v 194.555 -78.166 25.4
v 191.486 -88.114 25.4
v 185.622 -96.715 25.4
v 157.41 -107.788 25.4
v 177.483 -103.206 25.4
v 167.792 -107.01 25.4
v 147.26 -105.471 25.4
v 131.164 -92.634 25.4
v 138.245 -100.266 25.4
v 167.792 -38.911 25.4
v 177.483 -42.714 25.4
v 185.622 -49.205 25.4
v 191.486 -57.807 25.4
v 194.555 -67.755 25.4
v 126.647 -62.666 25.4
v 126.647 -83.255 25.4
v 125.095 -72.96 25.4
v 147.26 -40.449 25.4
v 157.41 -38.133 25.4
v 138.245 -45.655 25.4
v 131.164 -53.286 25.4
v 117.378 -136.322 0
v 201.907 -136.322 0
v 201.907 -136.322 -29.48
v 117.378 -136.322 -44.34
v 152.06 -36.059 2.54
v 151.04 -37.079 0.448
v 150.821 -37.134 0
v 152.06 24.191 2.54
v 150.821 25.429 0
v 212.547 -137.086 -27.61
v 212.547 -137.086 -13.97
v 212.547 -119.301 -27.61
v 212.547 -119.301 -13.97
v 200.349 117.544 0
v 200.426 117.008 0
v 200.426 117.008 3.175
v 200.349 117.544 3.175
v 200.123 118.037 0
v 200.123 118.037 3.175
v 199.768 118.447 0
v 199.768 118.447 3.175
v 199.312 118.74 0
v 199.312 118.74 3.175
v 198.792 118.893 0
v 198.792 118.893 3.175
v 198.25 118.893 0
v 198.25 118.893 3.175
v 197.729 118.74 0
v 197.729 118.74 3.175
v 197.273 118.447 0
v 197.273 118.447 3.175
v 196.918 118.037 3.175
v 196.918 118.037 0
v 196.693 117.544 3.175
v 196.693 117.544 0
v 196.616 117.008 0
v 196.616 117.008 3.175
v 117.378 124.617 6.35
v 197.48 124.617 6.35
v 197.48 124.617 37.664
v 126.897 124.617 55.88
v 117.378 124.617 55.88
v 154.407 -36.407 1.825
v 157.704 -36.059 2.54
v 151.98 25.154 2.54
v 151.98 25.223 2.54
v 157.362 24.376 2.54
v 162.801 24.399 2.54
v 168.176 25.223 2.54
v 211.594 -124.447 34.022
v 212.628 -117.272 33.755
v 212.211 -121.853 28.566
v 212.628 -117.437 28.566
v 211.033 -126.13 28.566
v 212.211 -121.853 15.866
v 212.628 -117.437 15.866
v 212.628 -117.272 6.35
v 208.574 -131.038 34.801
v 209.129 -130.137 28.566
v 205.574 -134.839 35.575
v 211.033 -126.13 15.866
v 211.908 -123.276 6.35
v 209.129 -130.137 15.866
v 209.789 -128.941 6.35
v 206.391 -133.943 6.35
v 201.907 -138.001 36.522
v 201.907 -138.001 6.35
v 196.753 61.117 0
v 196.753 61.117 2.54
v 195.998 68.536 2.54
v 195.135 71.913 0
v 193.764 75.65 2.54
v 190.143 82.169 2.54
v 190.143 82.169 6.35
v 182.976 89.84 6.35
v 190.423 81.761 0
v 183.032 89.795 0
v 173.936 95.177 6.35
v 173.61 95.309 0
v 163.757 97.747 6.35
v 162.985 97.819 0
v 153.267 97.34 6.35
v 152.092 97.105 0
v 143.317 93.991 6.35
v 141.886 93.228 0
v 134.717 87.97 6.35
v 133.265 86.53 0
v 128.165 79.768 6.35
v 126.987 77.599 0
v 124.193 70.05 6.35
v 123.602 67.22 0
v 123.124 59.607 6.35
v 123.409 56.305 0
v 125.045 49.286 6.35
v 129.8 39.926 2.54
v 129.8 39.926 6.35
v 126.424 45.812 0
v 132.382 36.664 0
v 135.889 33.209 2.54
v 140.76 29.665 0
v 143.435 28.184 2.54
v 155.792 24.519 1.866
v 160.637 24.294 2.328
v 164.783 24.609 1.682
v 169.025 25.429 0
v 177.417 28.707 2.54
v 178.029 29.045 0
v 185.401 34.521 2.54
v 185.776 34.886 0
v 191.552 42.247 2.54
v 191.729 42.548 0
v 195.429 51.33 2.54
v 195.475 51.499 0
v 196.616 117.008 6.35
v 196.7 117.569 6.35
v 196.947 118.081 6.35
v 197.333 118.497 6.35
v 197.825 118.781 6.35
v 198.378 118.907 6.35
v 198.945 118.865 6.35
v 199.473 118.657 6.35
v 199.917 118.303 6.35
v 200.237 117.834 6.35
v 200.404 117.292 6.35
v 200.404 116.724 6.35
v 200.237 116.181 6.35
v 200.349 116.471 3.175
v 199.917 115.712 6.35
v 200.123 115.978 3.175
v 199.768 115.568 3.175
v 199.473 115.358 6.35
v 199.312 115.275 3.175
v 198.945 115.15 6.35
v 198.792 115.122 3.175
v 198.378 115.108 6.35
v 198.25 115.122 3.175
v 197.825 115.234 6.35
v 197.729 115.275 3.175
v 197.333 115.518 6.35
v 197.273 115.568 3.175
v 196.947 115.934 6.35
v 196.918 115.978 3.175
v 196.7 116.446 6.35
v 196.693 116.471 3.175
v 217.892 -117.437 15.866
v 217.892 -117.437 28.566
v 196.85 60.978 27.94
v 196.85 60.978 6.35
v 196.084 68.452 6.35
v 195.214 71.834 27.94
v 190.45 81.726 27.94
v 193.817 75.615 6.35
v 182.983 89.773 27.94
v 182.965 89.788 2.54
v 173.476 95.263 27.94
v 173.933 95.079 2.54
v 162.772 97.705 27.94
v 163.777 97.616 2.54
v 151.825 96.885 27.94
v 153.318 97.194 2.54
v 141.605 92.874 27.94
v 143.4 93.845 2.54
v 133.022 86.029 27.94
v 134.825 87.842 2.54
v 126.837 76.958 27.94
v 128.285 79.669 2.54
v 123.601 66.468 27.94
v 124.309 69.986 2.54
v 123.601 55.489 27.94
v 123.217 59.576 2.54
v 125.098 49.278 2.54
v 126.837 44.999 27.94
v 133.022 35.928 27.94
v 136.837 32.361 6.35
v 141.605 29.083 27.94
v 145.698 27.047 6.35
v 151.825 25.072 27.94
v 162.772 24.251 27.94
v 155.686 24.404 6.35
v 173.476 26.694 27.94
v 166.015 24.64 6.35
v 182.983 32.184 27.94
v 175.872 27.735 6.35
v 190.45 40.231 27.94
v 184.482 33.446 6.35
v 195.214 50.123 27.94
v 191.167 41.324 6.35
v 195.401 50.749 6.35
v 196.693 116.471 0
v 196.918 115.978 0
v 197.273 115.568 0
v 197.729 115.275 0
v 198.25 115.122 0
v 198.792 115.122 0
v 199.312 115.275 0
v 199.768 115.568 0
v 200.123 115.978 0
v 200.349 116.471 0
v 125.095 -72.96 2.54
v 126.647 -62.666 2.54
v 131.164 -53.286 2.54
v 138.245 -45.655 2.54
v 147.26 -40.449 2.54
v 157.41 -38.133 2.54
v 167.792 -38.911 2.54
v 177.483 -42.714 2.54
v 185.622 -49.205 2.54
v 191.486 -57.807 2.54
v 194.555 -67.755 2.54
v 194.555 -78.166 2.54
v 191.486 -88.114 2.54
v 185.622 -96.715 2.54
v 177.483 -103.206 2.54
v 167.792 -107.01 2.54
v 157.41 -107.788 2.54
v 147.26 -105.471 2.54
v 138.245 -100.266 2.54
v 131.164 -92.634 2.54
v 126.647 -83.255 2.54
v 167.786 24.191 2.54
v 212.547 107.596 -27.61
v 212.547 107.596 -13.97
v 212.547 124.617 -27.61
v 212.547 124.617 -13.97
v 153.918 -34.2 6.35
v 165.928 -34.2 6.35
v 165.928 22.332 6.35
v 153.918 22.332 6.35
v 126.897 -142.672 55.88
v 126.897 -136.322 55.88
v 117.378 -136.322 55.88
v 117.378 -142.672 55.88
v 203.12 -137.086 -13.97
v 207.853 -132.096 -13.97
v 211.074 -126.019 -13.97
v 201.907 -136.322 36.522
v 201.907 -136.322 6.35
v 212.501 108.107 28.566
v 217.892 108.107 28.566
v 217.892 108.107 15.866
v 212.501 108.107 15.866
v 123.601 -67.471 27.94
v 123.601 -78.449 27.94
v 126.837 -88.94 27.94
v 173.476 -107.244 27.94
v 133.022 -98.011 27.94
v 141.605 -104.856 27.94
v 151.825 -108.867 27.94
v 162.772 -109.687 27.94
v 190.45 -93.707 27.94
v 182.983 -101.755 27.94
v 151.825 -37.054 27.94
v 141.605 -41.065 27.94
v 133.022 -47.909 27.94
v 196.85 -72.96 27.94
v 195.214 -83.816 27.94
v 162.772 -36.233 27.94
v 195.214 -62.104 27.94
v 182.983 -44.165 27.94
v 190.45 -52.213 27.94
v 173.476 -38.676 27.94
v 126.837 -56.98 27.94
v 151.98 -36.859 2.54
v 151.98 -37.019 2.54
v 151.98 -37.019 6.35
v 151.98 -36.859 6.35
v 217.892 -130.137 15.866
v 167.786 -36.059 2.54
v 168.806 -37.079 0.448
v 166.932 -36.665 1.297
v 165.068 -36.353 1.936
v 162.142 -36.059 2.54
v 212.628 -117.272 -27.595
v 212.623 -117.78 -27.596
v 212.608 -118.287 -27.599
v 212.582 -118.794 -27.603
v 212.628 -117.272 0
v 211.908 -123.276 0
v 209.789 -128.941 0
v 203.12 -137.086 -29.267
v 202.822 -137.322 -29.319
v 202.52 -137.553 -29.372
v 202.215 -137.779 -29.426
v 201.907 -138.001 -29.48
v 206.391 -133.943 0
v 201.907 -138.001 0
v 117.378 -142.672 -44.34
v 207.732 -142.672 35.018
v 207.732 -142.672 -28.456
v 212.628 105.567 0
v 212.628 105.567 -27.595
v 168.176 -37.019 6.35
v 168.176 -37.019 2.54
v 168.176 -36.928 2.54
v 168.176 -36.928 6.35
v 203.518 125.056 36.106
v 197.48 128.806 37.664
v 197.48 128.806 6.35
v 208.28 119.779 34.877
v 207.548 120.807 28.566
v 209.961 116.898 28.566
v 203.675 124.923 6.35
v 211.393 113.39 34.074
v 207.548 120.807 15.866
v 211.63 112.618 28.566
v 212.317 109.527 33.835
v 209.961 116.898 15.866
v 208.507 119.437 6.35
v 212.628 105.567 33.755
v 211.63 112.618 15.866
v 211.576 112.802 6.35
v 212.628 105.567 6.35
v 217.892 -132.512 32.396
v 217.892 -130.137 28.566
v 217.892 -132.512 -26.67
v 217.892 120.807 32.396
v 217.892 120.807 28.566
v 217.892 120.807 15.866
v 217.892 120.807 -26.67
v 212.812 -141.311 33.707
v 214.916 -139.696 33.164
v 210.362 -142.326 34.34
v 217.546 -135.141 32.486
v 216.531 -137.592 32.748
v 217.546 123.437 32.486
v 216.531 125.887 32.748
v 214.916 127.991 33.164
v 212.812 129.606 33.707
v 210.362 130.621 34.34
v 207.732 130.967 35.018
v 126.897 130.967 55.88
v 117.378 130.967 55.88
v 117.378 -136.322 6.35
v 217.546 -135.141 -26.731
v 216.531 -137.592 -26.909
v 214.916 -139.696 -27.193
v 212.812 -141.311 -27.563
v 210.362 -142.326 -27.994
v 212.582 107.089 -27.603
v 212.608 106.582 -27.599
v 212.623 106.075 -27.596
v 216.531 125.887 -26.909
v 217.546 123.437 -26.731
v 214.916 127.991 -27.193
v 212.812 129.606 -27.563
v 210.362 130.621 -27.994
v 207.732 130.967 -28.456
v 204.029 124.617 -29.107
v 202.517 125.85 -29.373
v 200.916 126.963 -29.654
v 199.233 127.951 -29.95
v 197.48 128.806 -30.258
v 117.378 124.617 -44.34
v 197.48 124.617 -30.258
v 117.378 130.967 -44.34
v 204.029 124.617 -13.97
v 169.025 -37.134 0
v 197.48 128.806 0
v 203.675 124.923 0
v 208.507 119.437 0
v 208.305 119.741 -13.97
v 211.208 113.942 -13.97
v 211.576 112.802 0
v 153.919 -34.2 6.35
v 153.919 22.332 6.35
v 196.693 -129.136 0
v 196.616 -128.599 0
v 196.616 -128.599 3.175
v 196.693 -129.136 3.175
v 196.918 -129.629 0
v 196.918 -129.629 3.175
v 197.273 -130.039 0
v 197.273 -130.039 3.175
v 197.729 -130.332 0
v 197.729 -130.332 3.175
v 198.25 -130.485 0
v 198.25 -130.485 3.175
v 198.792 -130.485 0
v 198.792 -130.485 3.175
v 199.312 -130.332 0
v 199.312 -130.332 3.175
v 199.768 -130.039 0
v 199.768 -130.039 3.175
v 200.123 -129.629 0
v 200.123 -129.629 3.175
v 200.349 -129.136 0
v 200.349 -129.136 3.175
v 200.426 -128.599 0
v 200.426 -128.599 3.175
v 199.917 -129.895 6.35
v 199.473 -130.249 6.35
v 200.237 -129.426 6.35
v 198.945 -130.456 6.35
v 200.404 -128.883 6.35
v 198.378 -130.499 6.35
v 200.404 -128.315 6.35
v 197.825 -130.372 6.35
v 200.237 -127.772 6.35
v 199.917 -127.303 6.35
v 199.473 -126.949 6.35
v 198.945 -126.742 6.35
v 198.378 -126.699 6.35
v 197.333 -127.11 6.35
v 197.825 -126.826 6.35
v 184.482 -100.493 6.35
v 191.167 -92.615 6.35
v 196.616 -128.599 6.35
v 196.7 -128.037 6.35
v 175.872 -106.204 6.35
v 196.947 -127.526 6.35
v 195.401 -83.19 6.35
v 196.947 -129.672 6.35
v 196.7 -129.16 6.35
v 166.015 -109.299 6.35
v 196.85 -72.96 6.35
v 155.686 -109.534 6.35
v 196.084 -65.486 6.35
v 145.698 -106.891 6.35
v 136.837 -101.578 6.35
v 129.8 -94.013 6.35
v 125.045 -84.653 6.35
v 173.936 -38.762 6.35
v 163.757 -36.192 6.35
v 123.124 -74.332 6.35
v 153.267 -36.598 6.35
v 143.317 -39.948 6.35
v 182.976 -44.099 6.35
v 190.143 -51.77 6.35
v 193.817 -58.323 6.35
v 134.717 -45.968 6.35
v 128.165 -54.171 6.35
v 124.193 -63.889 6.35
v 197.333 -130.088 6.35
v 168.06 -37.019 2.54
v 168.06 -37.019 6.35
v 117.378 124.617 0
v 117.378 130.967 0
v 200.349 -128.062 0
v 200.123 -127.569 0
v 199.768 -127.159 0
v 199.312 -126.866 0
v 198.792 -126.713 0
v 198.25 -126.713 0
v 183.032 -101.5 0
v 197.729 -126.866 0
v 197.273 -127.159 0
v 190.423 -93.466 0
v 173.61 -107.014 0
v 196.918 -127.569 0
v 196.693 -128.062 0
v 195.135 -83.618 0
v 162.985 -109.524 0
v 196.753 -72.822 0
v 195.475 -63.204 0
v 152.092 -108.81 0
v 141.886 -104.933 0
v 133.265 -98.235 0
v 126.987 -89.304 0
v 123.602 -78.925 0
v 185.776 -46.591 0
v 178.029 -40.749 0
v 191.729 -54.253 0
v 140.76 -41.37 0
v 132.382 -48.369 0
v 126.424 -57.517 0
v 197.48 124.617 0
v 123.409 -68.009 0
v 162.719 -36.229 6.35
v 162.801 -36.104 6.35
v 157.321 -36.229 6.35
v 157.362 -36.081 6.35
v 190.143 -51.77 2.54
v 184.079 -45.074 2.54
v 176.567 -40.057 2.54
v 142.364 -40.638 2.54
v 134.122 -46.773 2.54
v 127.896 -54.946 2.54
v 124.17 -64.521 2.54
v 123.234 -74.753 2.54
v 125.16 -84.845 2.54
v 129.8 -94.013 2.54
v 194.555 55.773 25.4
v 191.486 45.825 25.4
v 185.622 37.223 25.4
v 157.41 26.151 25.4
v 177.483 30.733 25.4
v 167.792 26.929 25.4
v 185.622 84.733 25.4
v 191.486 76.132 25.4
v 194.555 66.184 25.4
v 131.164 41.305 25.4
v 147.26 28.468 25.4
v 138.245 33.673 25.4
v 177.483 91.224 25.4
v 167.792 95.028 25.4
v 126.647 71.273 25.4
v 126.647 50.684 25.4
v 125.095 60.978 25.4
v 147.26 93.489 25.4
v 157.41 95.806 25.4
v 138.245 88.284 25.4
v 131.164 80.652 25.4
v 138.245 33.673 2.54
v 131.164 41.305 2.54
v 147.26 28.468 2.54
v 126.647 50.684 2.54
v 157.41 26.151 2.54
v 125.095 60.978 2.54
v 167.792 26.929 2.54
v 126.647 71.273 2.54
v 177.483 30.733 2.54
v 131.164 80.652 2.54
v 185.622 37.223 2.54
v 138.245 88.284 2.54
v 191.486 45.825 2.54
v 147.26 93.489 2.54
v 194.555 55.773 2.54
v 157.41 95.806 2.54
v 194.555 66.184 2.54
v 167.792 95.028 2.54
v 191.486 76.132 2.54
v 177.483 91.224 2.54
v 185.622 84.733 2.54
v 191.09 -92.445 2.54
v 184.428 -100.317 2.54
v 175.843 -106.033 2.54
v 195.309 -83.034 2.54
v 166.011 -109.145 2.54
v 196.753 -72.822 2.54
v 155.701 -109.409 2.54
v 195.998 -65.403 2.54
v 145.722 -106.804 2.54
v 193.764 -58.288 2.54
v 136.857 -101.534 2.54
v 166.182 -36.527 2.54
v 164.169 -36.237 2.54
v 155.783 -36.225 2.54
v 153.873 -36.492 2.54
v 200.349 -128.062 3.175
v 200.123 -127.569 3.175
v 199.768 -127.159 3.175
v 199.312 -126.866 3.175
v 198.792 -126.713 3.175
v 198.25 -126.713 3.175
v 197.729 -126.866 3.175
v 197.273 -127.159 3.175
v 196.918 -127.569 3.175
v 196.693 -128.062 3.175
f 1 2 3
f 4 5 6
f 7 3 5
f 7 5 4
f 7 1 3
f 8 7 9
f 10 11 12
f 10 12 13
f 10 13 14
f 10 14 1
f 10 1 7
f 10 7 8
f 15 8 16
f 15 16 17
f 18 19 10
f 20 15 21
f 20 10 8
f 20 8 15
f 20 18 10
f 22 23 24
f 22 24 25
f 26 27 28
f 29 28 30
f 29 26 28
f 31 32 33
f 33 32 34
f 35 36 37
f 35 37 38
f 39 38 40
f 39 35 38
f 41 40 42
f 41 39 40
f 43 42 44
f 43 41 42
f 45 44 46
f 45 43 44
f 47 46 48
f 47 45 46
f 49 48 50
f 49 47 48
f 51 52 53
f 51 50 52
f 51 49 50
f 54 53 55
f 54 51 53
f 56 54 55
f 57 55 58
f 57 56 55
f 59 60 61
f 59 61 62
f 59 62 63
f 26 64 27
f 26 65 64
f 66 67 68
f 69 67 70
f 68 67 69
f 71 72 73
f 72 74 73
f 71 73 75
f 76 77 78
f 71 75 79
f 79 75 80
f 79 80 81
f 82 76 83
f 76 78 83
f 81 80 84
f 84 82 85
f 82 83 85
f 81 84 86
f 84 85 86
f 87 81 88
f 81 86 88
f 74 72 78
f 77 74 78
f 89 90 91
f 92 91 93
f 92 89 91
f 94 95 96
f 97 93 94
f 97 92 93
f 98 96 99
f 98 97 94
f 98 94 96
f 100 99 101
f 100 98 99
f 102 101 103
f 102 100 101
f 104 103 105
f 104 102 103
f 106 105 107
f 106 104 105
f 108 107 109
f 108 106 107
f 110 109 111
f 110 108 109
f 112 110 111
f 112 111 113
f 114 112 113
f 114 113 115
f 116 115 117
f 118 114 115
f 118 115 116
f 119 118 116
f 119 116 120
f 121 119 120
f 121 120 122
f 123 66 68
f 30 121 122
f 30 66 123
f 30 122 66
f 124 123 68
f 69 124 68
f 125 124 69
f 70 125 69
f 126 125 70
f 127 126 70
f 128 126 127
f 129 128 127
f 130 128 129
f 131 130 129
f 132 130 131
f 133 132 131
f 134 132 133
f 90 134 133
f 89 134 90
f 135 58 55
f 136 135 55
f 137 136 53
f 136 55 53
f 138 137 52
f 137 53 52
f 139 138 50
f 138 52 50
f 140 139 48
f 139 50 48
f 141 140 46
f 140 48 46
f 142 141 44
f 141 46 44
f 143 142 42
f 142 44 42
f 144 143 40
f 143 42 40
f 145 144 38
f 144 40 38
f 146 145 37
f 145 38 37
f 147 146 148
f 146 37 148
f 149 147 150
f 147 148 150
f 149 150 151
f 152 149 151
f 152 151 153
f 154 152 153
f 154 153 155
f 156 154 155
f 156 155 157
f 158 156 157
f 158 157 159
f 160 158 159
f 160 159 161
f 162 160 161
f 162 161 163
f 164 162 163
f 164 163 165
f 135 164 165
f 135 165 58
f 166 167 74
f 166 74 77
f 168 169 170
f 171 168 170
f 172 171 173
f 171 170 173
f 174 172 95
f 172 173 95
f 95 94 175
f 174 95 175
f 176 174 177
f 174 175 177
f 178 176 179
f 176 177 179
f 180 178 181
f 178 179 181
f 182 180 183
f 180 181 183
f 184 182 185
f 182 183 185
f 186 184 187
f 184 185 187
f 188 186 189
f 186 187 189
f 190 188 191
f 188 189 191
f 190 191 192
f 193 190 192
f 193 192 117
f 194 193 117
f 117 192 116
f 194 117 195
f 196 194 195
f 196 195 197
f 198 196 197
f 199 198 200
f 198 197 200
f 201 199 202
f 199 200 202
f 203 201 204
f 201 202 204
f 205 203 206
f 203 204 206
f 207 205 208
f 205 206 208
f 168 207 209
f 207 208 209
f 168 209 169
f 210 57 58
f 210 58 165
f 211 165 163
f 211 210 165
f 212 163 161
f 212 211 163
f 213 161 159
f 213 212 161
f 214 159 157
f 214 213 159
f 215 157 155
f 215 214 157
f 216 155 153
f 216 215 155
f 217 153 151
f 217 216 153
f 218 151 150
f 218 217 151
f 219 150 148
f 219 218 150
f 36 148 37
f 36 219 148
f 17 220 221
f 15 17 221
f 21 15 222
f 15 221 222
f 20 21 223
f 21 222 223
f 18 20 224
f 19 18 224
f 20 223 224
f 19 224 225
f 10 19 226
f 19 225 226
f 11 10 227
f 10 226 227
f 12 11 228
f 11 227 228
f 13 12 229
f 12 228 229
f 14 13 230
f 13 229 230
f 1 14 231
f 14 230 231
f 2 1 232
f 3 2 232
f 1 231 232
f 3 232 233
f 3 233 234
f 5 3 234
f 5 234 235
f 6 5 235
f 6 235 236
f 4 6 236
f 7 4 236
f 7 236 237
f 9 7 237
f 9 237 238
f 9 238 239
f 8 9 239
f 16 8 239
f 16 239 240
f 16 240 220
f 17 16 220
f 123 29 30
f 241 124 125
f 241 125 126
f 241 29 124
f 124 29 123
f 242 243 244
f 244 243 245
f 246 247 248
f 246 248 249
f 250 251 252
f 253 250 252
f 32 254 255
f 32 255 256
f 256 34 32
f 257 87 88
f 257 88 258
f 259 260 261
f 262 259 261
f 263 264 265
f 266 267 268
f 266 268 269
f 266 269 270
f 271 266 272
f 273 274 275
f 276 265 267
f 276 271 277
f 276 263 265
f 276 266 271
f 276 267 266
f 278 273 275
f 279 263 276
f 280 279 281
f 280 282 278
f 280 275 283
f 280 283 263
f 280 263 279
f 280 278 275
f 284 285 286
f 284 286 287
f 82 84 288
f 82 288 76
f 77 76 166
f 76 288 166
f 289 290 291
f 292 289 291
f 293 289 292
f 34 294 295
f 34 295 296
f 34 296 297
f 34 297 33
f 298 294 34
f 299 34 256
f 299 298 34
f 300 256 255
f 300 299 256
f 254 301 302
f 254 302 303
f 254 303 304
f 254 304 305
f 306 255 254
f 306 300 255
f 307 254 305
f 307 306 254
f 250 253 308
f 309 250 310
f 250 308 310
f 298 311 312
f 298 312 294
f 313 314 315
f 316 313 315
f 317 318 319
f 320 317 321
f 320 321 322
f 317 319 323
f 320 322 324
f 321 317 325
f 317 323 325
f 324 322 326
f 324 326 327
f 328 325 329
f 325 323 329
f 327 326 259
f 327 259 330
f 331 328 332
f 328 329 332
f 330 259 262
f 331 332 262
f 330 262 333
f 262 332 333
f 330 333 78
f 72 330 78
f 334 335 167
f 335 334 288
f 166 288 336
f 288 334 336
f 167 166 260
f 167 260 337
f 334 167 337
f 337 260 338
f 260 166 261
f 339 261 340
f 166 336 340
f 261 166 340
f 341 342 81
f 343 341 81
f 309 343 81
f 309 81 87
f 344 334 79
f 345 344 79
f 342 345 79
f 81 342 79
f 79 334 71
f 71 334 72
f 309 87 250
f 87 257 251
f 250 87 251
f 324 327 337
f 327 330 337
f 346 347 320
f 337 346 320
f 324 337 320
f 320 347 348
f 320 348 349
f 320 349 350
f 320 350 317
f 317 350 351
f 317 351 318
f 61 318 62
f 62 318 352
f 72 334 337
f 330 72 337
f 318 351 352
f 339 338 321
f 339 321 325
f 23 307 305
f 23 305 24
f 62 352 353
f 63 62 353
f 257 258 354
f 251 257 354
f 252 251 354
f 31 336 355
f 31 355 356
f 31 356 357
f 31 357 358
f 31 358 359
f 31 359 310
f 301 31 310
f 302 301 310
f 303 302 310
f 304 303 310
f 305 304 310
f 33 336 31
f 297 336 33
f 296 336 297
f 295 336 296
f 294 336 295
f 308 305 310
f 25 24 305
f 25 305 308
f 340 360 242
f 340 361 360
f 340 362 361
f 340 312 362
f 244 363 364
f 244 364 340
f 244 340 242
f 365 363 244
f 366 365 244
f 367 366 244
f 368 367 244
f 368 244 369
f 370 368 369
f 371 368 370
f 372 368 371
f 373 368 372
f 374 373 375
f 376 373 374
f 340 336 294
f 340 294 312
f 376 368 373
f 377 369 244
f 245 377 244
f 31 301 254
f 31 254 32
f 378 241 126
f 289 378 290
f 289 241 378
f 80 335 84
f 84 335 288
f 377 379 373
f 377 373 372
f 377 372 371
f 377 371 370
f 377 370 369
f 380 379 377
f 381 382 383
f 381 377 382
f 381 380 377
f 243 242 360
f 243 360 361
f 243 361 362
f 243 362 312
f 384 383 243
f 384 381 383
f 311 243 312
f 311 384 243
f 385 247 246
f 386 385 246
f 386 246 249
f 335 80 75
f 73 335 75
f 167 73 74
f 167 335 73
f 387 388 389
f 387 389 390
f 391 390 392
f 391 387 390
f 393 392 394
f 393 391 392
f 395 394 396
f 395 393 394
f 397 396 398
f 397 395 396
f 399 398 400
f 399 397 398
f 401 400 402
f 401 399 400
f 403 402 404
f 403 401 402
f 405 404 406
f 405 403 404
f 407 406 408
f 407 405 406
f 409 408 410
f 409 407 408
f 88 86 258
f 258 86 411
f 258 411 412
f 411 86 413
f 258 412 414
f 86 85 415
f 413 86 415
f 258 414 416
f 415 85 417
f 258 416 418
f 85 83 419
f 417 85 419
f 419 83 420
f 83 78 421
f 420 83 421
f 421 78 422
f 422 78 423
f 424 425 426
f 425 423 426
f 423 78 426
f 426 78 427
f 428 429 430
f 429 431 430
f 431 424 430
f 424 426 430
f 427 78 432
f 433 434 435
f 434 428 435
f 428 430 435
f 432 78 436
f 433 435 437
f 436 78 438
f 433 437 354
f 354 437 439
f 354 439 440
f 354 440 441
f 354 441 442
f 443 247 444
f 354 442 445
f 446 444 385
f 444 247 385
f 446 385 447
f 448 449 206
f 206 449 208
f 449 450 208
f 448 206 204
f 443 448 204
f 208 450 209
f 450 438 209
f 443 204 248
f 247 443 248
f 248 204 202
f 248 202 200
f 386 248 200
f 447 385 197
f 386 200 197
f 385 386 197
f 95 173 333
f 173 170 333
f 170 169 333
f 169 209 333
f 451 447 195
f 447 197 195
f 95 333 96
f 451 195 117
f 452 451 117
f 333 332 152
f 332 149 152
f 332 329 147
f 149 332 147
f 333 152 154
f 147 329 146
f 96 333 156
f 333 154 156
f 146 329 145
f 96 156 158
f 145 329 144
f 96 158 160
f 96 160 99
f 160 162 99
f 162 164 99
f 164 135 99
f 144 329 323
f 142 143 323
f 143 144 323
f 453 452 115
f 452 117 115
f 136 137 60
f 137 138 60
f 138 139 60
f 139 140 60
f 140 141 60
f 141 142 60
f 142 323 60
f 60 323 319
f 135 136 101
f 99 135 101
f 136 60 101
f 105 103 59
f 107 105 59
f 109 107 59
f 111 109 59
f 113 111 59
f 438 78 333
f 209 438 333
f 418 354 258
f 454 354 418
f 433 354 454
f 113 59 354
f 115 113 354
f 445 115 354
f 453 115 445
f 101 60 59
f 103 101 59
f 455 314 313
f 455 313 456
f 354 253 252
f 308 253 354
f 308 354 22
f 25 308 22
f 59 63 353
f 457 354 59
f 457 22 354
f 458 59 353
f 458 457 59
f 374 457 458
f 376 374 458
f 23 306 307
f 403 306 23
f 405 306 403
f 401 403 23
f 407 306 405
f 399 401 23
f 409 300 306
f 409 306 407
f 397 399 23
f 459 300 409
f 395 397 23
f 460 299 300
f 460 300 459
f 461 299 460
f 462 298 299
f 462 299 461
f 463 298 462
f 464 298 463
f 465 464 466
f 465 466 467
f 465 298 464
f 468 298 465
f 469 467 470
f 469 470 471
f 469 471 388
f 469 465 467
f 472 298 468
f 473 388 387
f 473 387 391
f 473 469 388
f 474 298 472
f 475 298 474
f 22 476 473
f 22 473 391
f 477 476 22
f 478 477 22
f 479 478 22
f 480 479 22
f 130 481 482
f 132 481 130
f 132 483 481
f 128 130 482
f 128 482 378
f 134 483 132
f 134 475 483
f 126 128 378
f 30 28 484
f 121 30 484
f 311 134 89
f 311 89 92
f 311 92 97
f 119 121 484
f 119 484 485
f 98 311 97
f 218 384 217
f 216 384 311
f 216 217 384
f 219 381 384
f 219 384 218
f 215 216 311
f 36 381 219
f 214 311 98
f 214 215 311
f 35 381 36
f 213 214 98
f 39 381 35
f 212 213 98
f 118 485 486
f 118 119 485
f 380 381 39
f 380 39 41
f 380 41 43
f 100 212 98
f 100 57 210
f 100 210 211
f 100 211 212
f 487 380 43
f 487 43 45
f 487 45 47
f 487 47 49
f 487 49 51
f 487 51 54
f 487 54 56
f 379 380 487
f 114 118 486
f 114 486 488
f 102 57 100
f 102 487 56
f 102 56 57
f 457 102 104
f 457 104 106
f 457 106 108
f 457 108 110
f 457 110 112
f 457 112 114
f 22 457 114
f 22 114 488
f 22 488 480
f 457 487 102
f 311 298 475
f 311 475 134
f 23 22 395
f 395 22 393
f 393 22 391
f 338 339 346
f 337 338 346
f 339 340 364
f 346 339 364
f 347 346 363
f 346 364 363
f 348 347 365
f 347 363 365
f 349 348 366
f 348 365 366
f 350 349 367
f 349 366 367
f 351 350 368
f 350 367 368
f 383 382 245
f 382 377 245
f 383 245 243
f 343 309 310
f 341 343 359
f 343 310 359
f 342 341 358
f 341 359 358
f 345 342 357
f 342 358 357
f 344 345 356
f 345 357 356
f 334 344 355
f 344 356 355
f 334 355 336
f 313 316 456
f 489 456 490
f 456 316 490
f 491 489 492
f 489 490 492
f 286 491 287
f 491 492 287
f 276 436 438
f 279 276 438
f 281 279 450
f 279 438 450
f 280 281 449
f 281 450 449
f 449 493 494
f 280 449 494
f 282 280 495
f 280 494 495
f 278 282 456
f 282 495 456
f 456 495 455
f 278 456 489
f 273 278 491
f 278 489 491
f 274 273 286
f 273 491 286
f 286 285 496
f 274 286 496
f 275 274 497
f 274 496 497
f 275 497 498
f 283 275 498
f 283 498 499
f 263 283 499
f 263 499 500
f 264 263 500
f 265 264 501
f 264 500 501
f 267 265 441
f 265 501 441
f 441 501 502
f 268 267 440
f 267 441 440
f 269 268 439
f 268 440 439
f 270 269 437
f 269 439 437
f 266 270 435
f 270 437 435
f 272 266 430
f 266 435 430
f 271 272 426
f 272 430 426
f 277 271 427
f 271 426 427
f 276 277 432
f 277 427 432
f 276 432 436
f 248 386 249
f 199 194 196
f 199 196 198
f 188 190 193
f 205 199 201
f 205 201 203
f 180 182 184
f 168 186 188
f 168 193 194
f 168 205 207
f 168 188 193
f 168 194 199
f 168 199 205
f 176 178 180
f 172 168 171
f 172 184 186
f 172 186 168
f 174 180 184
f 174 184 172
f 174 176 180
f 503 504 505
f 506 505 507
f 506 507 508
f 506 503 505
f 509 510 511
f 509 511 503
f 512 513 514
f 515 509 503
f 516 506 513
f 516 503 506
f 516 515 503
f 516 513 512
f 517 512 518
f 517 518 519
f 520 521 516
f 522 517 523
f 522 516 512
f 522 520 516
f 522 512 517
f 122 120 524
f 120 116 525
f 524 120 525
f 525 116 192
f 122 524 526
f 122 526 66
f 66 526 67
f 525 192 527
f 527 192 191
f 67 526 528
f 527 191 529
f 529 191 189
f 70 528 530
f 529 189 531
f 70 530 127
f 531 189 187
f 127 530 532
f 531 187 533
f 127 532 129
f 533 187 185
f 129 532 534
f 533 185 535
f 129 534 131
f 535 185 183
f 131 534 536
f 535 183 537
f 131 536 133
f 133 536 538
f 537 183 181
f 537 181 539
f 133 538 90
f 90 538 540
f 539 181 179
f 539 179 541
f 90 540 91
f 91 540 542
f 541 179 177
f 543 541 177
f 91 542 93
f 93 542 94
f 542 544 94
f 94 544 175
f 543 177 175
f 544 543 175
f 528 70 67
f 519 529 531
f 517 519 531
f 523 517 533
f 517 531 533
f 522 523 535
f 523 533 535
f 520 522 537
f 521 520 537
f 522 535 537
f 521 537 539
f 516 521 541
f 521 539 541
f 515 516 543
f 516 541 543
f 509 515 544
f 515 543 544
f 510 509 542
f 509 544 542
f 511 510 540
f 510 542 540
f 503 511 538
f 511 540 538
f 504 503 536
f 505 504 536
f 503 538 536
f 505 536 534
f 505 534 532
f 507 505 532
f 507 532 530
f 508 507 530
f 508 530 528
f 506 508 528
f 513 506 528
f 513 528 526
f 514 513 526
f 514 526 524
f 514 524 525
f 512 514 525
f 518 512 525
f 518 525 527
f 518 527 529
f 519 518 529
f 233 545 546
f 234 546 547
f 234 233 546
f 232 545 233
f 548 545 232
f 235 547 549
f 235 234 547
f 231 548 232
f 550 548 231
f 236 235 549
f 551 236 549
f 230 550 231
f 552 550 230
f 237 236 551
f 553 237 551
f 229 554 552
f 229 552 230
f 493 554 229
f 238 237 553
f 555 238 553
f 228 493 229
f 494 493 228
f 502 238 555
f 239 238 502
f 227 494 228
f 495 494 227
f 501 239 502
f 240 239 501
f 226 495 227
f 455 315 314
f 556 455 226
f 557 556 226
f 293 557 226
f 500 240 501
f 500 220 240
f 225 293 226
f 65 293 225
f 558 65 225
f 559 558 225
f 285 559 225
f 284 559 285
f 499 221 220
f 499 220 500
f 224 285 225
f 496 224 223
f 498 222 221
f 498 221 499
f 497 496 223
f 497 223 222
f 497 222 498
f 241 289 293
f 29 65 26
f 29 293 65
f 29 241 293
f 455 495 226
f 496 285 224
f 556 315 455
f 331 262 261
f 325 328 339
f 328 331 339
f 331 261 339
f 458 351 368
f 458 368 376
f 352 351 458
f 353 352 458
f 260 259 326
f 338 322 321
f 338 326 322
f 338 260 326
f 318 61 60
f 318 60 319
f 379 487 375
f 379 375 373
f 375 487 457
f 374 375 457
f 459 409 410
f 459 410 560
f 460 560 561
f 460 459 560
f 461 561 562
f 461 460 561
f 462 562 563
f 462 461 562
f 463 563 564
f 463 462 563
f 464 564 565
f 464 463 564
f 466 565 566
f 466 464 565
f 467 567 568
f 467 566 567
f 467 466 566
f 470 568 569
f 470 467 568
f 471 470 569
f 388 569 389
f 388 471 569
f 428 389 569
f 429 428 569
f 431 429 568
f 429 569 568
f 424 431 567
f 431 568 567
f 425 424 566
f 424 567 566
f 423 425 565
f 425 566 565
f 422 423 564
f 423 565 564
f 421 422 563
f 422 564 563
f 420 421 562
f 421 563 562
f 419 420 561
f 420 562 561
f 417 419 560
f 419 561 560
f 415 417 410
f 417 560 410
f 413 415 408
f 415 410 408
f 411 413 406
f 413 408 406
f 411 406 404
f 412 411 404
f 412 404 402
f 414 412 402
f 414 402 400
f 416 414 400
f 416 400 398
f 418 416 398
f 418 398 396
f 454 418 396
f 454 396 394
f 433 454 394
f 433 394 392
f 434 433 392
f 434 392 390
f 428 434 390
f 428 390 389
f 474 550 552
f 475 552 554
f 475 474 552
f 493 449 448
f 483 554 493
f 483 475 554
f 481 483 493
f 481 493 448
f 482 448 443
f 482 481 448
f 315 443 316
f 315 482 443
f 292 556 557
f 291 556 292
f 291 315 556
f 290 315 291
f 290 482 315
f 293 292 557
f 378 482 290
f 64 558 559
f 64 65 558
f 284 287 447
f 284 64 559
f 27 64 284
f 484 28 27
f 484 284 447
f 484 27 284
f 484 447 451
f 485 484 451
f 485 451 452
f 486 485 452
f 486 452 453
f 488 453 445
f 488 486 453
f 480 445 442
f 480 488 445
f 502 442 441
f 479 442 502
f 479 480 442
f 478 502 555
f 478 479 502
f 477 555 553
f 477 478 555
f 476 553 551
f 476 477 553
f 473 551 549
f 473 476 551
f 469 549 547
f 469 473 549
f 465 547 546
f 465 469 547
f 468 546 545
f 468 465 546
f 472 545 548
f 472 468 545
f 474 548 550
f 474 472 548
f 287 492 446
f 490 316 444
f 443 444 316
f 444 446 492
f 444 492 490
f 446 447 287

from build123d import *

# Parameters (mm, degrees)
SKETCH7_R                = 36.83
SKETCH7_R_2              = 1.905
BOSS_EXTRUDE1_DEPTH      = 6.35
SKETCH8_R                = 36.83
BOSS_EXTRUDE2_DEPTH      = 25.4
BOSS_EXTRUDE2_DEPTH_BACK = 0.000254
SKETCH9_R                = 34.925
CUT_EXTRUDE4_DEPTH       = 25.4
BOSS_EXTRUDE3_DEPTH      = 3.175
BOSS_EXTRUDE4_DEPTH      = 38.1
BOSS_EXTRUDE4_DEPTH_BACK = 40.64
CUT_EXTRUDE5_START       = -20.32
SKETCH12_W               = 34.495809925
SKETCH12_H               = 261.703089784
CUT_EXTRUDE5_DEPTH       = 48.26
SKETCH18_W               = 80.102069995
SKETCH18_H               = 6.35
SKETCH18_W_2             = 84.52860838
BOSS_EXTRUDE7_DEPTH      = 66.04
BOSS_EXTRUDE7_DEPTH_BACK = 55.88
MAIN_ANGLE_DEPTH         = 274.638700862
SKETCH19_W               = 12.7
SKETCH19_H               = 12.7
CUT_EXTRUDE8_DEPTH       = 45.72
SKETCH20_W               = 18.203212612
SKETCH20_H               = 62.726676146
CUT_EXTRUDE9_DEPTH       = 6.35
CUT_EXTRUDE9_TAPER       = 26
SKETCH23_R               = 1.905
CUT_EXTRUDE10_DEPTH      = 56.88
SKETCH24_W               = 16.196066748
SKETCH24_H               = 62.242020171
BOSS_EXTRUDE10_DEPTH     = 3.81


with BuildPart() as part:
    # Sketch7 → Boss-Extrude1 (new body)
    with BuildSketch(Plane.XY):
        with BuildLine():
            Line((117.378076693, -136.321789995), (117.378076693, 124.616910866))
            Line((117.378076693, 124.616910866), (117.378076693, 130.966910866))
            Line((117.378076693, 130.966910866), (187.228076693, 130.966910866))
            ThreePointArc((187.228076693, 130.966910866), (205.188588935, 123.527423108), (212.628076693, 105.566910866))
            Line((212.628076693, 105.566910866), (212.628076693, -117.271789995))
            ThreePointArc((212.628076693, -117.271789995), (205.188588935, -135.232302238), (187.228076693, -142.671789995))
            Line((187.228076693, -142.671789995), (117.378076693, -142.671789995))
            Line((117.378076693, -142.671789995), (117.378076693, -136.321789995))
        make_face()
        with Locations((159.923076693, 61.116910866)):
            Circle(SKETCH7_R, mode=Mode.SUBTRACT)
        with Locations((159.923076693, -72.821789995)):
            Circle(SKETCH7_R, mode=Mode.SUBTRACT)
        with Locations((198.520756421, 117.007578537)):
            Circle(SKETCH7_R_2, mode=Mode.SUBTRACT)
        with Locations((198.520756421, -128.598951794)):
            Circle(SKETCH7_R_2, mode=Mode.SUBTRACT)
    extrude(amount=BOSS_EXTRUDE1_DEPTH)

    # Sketch8 → Boss-Extrude2 (add, two sides)
    with BuildSketch(Plane.XY.offset(2.54)) as boss_extrude2_sk:
        with Locations((160.02, 60.978458264)):
            Circle(SKETCH8_R)
        with Locations((160.02, -72.960242597)):
            Circle(SKETCH8_R)
    extrude(amount=BOSS_EXTRUDE2_DEPTH)
    extrude(boss_extrude2_sk.sketch, amount=-BOSS_EXTRUDE2_DEPTH_BACK)

    # Sketch9 → Cut-Extrude4 (cut)
    with BuildSketch(Plane(origin=(0, 0, 0), x_dir=(-1, 0, 0), z_dir=(0, 0, -1))):
        with Locations((-160.02, 60.978458264)):
            Circle(SKETCH9_R)
        with Locations((-160.02, -72.960242597)):
            Circle(SKETCH9_R)
    extrude(amount=-CUT_EXTRUDE4_DEPTH, mode=Mode.SUBTRACT)

    # Sketch10 → Boss-Extrude3 (add)
    with BuildSketch(Plane.XY.offset(6.35)):
        with BuildLine():
            Line((187.228076693, 130.966910866), (187.228076693, 105.566910866))
            Line((187.228076693, 105.566910866), (212.628076693, 105.566910866))
            ThreePointArc((212.628076693, 105.566910866), (205.188588935, 123.527423108), (187.228076693, 130.966910866))
        make_face()
        with BuildLine():
            Line((212.628076693, -117.271789995), (187.228076693, -117.271789995))
            Line((187.228076693, -117.271789995), (187.228076693, -142.671789995))
            ThreePointArc((187.228076693, -142.671789995), (205.188588935, -135.232302238), (212.628076693, -117.271789995))
        make_face()
    extrude(amount=-BOSS_EXTRUDE3_DEPTH)

    # Sketch11 → Boss-Extrude4 (add, two sides)
    with BuildSketch(Plane(origin=(0, 0, 0), x_dir=(-1, 0, 0), z_dir=(0, 0, -1))) as boss_extrude4_sk:
        with BuildLine():
            Line((-217.892216682, -132.511789995), (-217.892216682, 120.806910866))
            ThreePointArc((-217.892216682, 120.806910866), (-214.916421579, 127.991115763), (-207.732216682, 130.966910866))
            Line((-207.732216682, 130.966910866), (-187.228076693, 130.966910866))
            ThreePointArc((-187.228076693, 130.966910866), (-205.188588935, 123.527423108), (-212.628076693, 105.566910866))
            Line((-212.628076693, 105.566910866), (-212.628076693, -117.271789995))
            ThreePointArc((-212.628076693, -117.271789995), (-205.188588935, -135.232302238), (-187.228076693, -142.671789995))
            Line((-187.228076693, -142.671789995), (-207.732216682, -142.671789995))
            ThreePointArc((-207.732216682, -142.671789995), (-214.916421579, -139.695994892), (-217.892216682, -132.511789995))
        make_face()
    extrude(amount=BOSS_EXTRUDE4_DEPTH)
    extrude(boss_extrude4_sk.sketch, amount=-BOSS_EXTRUDE4_DEPTH_BACK)

    # Sketch12 → Cut-Extrude5 (cut)
    with BuildSketch(Plane.XY.offset(6.35).offset(CUT_EXTRUDE5_START)):
        with Locations((195.299001462, -6.234634026)):
            Rectangle(SKETCH12_W, SKETCH12_H)
    extrude(amount=-CUT_EXTRUDE5_DEPTH, mode=Mode.SUBTRACT)

    # Sketch18 → Boss-Extrude7 (add, two sides)
    with BuildSketch(Plane(origin=(0, 0, 0), x_dir=(-1, 0, 0), z_dir=(0, 0, -1))) as boss_extrude7_sk:
        with Locations((-157.429111691, 127.791910866)):
            Rectangle(SKETCH18_W, SKETCH18_H)
        with Locations((-159.642380883, -139.496789995)):
            Rectangle(SKETCH18_W_2, SKETCH18_H)
    extrude(amount=BOSS_EXTRUDE7_DEPTH)
    extrude(boss_extrude7_sk.sketch, amount=-BOSS_EXTRUDE7_DEPTH_BACK)

    # Sketch16 → main angle (cut, through all)
    with BuildSketch(Plane(origin=(0, 130.966910866, 0), x_dir=(1, 0, 0), z_dir=(0, 1, 0))):
        Polygon((217.892216682, 26.67), (-101.016881875, 82.73406518), (217.892216682, 82.73406518), align=None)
        Polygon((217.892216682, -32.396277701), (47.589100189, -76.347646381), (217.892216682, -67.47666805), align=None)
    extrude(amount=-MAIN_ANGLE_DEPTH, mode=Mode.SUBTRACT)

    # Sketch19 → Cut-Extrude8 (cut)
    with BuildSketch(Plane(origin=(217.892216682, 0, 0), x_dir=(0, 0, -1), z_dir=(1, 0, 0))):
        with Locations((-22.215809399, -123.786574298)):
            Rectangle(SKETCH19_W, SKETCH19_H)
        with Locations((-22.215809399, 114.456910866)):
            Rectangle(SKETCH19_W, SKETCH19_H)
    extrude(amount=-CUT_EXTRUDE8_DEPTH, mode=Mode.SUBTRACT)

    # Sketch20 → Cut-Extrude9 (cut)
    with BuildSketch(Plane(origin=(0, 0, 0), x_dir=(-1, 0, 0), z_dir=(0, 0, -1))):
        with Locations((-159.923076693, -5.934095423)):
            Rectangle(SKETCH20_W, SKETCH20_H)
    extrude(amount=-CUT_EXTRUDE9_DEPTH, taper=CUT_EXTRUDE9_TAPER, mode=Mode.SUBTRACT)

    # Sketch23 → Cut-Extrude10 (cut, through all)
    with BuildSketch(Plane(origin=(0, 0, 0), x_dir=(-1, 0, 0), z_dir=(0, 0, -1))):
        with Locations((-198.520756421, 117.007578537)):
            Circle(SKETCH23_R)
        with Locations((-198.520756421, -128.598951794)):
            Circle(SKETCH23_R)
    extrude(amount=-CUT_EXTRUDE10_DEPTH, mode=Mode.SUBTRACT)

    # Sketch24 → Boss-Extrude10 (add)
    with BuildSketch(Plane(origin=(0, 0, 2.539746), x_dir=(-1, 0, 0), z_dir=(0, 0, -1))):
        with Locations((-160.078035159, -5.897511229)):
            Rectangle(SKETCH24_W, SKETCH24_H)
    extrude(amount=-BOSS_EXTRUDE10_DEPTH)


solid = part.part
